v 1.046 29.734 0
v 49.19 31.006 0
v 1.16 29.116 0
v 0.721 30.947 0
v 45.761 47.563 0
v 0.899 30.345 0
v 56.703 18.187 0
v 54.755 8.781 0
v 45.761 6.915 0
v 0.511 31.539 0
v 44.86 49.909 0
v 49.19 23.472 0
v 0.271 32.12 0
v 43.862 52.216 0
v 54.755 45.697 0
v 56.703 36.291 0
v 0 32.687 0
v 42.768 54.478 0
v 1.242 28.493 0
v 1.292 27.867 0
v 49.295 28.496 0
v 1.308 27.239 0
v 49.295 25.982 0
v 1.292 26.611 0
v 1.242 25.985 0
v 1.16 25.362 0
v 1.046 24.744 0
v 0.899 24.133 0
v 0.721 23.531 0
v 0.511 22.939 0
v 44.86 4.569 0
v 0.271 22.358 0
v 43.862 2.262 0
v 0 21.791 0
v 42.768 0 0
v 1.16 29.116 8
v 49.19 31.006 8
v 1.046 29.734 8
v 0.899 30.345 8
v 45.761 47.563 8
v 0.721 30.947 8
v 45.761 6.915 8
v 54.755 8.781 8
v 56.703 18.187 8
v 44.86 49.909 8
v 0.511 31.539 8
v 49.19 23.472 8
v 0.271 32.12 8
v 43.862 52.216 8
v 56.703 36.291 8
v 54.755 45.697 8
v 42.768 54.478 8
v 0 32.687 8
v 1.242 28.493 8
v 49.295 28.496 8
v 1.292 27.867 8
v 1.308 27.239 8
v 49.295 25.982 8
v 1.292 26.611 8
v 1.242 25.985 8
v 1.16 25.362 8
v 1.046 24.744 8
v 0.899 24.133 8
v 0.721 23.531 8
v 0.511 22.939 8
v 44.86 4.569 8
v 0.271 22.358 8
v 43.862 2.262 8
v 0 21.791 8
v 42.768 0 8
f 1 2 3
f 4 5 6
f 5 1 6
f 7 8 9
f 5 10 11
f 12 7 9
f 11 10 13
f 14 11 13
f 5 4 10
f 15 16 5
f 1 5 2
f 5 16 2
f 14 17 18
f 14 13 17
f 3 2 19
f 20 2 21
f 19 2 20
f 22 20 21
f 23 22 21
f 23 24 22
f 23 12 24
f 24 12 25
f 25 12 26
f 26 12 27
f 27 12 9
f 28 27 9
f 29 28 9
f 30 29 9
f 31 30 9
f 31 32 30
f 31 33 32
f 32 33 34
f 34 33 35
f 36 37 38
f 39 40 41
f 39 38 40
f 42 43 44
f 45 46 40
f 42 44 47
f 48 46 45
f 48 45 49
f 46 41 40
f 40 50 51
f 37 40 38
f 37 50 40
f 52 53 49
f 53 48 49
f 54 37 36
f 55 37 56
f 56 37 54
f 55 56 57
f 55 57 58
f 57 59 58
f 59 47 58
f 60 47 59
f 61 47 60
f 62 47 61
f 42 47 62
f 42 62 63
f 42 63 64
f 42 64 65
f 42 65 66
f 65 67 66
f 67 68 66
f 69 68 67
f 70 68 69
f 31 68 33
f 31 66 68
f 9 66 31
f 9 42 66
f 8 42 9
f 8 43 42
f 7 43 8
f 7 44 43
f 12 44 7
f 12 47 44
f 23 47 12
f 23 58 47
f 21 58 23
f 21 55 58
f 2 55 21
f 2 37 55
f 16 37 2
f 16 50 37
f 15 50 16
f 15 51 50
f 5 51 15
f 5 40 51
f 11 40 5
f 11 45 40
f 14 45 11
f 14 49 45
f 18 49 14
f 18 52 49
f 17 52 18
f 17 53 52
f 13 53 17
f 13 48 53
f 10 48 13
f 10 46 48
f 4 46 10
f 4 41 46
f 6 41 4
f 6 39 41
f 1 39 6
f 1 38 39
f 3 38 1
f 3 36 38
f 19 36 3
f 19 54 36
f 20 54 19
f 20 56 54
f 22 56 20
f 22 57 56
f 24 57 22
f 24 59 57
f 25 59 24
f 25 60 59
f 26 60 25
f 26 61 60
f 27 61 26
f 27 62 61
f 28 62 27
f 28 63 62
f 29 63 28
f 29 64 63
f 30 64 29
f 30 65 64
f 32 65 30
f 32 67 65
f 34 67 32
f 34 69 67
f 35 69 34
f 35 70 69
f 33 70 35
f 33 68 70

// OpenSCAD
$fn = 32;

// ----------------------------------------------------------------------
// Gear sector: 2 teeth on 54 degrees
// ----------------------------------------------------------------------

// --- parameters (mm) ---
sector_angle = 54;        // sector angle, degrees
root_r = 60;              // root circle radius
tooth_h = 8;              // tooth height over the root circle
teeth = 2;                // number of teeth on the sector
hub_r = 12;               // hub bore radius
plate_t = 8;              // sector thickness, Z
arc_step = 3;             // sampling step of the root/hub arcs, degrees

tip_r = root_r + tooth_h;  // tip circle radius

profile = [[42.768, 0], [43.862, 2.262], [44.86, 4.569], [45.761, 6.915], [54.755, 8.781], [56.703, 18.187], [49.19, 23.472], [49.295, 25.982], [49.295, 28.496], [49.19, 31.006], [56.703, 36.291], [54.755, 45.697], [45.761, 47.563], [44.86, 49.909], [43.862, 52.216], [42.768, 54.478], [0, 32.687], [0.271, 32.12], [0.511, 31.539], [0.721, 30.947], [0.899, 30.345], [1.046, 29.734], [1.16, 29.116], [1.242, 28.493], [1.292, 27.867], [1.308, 27.239], [1.292, 26.611], [1.242, 25.985], [1.16, 25.362], [1.046, 24.744], [0.899, 24.133], [0.721, 23.531], [0.511, 22.939], [0.271, 22.358], [0, 21.791]];  // primary outline, 35 points, counter clockwise

// --- the one profile operation ---
linear_extrude(height = plate_t) polygon(points = profile);
